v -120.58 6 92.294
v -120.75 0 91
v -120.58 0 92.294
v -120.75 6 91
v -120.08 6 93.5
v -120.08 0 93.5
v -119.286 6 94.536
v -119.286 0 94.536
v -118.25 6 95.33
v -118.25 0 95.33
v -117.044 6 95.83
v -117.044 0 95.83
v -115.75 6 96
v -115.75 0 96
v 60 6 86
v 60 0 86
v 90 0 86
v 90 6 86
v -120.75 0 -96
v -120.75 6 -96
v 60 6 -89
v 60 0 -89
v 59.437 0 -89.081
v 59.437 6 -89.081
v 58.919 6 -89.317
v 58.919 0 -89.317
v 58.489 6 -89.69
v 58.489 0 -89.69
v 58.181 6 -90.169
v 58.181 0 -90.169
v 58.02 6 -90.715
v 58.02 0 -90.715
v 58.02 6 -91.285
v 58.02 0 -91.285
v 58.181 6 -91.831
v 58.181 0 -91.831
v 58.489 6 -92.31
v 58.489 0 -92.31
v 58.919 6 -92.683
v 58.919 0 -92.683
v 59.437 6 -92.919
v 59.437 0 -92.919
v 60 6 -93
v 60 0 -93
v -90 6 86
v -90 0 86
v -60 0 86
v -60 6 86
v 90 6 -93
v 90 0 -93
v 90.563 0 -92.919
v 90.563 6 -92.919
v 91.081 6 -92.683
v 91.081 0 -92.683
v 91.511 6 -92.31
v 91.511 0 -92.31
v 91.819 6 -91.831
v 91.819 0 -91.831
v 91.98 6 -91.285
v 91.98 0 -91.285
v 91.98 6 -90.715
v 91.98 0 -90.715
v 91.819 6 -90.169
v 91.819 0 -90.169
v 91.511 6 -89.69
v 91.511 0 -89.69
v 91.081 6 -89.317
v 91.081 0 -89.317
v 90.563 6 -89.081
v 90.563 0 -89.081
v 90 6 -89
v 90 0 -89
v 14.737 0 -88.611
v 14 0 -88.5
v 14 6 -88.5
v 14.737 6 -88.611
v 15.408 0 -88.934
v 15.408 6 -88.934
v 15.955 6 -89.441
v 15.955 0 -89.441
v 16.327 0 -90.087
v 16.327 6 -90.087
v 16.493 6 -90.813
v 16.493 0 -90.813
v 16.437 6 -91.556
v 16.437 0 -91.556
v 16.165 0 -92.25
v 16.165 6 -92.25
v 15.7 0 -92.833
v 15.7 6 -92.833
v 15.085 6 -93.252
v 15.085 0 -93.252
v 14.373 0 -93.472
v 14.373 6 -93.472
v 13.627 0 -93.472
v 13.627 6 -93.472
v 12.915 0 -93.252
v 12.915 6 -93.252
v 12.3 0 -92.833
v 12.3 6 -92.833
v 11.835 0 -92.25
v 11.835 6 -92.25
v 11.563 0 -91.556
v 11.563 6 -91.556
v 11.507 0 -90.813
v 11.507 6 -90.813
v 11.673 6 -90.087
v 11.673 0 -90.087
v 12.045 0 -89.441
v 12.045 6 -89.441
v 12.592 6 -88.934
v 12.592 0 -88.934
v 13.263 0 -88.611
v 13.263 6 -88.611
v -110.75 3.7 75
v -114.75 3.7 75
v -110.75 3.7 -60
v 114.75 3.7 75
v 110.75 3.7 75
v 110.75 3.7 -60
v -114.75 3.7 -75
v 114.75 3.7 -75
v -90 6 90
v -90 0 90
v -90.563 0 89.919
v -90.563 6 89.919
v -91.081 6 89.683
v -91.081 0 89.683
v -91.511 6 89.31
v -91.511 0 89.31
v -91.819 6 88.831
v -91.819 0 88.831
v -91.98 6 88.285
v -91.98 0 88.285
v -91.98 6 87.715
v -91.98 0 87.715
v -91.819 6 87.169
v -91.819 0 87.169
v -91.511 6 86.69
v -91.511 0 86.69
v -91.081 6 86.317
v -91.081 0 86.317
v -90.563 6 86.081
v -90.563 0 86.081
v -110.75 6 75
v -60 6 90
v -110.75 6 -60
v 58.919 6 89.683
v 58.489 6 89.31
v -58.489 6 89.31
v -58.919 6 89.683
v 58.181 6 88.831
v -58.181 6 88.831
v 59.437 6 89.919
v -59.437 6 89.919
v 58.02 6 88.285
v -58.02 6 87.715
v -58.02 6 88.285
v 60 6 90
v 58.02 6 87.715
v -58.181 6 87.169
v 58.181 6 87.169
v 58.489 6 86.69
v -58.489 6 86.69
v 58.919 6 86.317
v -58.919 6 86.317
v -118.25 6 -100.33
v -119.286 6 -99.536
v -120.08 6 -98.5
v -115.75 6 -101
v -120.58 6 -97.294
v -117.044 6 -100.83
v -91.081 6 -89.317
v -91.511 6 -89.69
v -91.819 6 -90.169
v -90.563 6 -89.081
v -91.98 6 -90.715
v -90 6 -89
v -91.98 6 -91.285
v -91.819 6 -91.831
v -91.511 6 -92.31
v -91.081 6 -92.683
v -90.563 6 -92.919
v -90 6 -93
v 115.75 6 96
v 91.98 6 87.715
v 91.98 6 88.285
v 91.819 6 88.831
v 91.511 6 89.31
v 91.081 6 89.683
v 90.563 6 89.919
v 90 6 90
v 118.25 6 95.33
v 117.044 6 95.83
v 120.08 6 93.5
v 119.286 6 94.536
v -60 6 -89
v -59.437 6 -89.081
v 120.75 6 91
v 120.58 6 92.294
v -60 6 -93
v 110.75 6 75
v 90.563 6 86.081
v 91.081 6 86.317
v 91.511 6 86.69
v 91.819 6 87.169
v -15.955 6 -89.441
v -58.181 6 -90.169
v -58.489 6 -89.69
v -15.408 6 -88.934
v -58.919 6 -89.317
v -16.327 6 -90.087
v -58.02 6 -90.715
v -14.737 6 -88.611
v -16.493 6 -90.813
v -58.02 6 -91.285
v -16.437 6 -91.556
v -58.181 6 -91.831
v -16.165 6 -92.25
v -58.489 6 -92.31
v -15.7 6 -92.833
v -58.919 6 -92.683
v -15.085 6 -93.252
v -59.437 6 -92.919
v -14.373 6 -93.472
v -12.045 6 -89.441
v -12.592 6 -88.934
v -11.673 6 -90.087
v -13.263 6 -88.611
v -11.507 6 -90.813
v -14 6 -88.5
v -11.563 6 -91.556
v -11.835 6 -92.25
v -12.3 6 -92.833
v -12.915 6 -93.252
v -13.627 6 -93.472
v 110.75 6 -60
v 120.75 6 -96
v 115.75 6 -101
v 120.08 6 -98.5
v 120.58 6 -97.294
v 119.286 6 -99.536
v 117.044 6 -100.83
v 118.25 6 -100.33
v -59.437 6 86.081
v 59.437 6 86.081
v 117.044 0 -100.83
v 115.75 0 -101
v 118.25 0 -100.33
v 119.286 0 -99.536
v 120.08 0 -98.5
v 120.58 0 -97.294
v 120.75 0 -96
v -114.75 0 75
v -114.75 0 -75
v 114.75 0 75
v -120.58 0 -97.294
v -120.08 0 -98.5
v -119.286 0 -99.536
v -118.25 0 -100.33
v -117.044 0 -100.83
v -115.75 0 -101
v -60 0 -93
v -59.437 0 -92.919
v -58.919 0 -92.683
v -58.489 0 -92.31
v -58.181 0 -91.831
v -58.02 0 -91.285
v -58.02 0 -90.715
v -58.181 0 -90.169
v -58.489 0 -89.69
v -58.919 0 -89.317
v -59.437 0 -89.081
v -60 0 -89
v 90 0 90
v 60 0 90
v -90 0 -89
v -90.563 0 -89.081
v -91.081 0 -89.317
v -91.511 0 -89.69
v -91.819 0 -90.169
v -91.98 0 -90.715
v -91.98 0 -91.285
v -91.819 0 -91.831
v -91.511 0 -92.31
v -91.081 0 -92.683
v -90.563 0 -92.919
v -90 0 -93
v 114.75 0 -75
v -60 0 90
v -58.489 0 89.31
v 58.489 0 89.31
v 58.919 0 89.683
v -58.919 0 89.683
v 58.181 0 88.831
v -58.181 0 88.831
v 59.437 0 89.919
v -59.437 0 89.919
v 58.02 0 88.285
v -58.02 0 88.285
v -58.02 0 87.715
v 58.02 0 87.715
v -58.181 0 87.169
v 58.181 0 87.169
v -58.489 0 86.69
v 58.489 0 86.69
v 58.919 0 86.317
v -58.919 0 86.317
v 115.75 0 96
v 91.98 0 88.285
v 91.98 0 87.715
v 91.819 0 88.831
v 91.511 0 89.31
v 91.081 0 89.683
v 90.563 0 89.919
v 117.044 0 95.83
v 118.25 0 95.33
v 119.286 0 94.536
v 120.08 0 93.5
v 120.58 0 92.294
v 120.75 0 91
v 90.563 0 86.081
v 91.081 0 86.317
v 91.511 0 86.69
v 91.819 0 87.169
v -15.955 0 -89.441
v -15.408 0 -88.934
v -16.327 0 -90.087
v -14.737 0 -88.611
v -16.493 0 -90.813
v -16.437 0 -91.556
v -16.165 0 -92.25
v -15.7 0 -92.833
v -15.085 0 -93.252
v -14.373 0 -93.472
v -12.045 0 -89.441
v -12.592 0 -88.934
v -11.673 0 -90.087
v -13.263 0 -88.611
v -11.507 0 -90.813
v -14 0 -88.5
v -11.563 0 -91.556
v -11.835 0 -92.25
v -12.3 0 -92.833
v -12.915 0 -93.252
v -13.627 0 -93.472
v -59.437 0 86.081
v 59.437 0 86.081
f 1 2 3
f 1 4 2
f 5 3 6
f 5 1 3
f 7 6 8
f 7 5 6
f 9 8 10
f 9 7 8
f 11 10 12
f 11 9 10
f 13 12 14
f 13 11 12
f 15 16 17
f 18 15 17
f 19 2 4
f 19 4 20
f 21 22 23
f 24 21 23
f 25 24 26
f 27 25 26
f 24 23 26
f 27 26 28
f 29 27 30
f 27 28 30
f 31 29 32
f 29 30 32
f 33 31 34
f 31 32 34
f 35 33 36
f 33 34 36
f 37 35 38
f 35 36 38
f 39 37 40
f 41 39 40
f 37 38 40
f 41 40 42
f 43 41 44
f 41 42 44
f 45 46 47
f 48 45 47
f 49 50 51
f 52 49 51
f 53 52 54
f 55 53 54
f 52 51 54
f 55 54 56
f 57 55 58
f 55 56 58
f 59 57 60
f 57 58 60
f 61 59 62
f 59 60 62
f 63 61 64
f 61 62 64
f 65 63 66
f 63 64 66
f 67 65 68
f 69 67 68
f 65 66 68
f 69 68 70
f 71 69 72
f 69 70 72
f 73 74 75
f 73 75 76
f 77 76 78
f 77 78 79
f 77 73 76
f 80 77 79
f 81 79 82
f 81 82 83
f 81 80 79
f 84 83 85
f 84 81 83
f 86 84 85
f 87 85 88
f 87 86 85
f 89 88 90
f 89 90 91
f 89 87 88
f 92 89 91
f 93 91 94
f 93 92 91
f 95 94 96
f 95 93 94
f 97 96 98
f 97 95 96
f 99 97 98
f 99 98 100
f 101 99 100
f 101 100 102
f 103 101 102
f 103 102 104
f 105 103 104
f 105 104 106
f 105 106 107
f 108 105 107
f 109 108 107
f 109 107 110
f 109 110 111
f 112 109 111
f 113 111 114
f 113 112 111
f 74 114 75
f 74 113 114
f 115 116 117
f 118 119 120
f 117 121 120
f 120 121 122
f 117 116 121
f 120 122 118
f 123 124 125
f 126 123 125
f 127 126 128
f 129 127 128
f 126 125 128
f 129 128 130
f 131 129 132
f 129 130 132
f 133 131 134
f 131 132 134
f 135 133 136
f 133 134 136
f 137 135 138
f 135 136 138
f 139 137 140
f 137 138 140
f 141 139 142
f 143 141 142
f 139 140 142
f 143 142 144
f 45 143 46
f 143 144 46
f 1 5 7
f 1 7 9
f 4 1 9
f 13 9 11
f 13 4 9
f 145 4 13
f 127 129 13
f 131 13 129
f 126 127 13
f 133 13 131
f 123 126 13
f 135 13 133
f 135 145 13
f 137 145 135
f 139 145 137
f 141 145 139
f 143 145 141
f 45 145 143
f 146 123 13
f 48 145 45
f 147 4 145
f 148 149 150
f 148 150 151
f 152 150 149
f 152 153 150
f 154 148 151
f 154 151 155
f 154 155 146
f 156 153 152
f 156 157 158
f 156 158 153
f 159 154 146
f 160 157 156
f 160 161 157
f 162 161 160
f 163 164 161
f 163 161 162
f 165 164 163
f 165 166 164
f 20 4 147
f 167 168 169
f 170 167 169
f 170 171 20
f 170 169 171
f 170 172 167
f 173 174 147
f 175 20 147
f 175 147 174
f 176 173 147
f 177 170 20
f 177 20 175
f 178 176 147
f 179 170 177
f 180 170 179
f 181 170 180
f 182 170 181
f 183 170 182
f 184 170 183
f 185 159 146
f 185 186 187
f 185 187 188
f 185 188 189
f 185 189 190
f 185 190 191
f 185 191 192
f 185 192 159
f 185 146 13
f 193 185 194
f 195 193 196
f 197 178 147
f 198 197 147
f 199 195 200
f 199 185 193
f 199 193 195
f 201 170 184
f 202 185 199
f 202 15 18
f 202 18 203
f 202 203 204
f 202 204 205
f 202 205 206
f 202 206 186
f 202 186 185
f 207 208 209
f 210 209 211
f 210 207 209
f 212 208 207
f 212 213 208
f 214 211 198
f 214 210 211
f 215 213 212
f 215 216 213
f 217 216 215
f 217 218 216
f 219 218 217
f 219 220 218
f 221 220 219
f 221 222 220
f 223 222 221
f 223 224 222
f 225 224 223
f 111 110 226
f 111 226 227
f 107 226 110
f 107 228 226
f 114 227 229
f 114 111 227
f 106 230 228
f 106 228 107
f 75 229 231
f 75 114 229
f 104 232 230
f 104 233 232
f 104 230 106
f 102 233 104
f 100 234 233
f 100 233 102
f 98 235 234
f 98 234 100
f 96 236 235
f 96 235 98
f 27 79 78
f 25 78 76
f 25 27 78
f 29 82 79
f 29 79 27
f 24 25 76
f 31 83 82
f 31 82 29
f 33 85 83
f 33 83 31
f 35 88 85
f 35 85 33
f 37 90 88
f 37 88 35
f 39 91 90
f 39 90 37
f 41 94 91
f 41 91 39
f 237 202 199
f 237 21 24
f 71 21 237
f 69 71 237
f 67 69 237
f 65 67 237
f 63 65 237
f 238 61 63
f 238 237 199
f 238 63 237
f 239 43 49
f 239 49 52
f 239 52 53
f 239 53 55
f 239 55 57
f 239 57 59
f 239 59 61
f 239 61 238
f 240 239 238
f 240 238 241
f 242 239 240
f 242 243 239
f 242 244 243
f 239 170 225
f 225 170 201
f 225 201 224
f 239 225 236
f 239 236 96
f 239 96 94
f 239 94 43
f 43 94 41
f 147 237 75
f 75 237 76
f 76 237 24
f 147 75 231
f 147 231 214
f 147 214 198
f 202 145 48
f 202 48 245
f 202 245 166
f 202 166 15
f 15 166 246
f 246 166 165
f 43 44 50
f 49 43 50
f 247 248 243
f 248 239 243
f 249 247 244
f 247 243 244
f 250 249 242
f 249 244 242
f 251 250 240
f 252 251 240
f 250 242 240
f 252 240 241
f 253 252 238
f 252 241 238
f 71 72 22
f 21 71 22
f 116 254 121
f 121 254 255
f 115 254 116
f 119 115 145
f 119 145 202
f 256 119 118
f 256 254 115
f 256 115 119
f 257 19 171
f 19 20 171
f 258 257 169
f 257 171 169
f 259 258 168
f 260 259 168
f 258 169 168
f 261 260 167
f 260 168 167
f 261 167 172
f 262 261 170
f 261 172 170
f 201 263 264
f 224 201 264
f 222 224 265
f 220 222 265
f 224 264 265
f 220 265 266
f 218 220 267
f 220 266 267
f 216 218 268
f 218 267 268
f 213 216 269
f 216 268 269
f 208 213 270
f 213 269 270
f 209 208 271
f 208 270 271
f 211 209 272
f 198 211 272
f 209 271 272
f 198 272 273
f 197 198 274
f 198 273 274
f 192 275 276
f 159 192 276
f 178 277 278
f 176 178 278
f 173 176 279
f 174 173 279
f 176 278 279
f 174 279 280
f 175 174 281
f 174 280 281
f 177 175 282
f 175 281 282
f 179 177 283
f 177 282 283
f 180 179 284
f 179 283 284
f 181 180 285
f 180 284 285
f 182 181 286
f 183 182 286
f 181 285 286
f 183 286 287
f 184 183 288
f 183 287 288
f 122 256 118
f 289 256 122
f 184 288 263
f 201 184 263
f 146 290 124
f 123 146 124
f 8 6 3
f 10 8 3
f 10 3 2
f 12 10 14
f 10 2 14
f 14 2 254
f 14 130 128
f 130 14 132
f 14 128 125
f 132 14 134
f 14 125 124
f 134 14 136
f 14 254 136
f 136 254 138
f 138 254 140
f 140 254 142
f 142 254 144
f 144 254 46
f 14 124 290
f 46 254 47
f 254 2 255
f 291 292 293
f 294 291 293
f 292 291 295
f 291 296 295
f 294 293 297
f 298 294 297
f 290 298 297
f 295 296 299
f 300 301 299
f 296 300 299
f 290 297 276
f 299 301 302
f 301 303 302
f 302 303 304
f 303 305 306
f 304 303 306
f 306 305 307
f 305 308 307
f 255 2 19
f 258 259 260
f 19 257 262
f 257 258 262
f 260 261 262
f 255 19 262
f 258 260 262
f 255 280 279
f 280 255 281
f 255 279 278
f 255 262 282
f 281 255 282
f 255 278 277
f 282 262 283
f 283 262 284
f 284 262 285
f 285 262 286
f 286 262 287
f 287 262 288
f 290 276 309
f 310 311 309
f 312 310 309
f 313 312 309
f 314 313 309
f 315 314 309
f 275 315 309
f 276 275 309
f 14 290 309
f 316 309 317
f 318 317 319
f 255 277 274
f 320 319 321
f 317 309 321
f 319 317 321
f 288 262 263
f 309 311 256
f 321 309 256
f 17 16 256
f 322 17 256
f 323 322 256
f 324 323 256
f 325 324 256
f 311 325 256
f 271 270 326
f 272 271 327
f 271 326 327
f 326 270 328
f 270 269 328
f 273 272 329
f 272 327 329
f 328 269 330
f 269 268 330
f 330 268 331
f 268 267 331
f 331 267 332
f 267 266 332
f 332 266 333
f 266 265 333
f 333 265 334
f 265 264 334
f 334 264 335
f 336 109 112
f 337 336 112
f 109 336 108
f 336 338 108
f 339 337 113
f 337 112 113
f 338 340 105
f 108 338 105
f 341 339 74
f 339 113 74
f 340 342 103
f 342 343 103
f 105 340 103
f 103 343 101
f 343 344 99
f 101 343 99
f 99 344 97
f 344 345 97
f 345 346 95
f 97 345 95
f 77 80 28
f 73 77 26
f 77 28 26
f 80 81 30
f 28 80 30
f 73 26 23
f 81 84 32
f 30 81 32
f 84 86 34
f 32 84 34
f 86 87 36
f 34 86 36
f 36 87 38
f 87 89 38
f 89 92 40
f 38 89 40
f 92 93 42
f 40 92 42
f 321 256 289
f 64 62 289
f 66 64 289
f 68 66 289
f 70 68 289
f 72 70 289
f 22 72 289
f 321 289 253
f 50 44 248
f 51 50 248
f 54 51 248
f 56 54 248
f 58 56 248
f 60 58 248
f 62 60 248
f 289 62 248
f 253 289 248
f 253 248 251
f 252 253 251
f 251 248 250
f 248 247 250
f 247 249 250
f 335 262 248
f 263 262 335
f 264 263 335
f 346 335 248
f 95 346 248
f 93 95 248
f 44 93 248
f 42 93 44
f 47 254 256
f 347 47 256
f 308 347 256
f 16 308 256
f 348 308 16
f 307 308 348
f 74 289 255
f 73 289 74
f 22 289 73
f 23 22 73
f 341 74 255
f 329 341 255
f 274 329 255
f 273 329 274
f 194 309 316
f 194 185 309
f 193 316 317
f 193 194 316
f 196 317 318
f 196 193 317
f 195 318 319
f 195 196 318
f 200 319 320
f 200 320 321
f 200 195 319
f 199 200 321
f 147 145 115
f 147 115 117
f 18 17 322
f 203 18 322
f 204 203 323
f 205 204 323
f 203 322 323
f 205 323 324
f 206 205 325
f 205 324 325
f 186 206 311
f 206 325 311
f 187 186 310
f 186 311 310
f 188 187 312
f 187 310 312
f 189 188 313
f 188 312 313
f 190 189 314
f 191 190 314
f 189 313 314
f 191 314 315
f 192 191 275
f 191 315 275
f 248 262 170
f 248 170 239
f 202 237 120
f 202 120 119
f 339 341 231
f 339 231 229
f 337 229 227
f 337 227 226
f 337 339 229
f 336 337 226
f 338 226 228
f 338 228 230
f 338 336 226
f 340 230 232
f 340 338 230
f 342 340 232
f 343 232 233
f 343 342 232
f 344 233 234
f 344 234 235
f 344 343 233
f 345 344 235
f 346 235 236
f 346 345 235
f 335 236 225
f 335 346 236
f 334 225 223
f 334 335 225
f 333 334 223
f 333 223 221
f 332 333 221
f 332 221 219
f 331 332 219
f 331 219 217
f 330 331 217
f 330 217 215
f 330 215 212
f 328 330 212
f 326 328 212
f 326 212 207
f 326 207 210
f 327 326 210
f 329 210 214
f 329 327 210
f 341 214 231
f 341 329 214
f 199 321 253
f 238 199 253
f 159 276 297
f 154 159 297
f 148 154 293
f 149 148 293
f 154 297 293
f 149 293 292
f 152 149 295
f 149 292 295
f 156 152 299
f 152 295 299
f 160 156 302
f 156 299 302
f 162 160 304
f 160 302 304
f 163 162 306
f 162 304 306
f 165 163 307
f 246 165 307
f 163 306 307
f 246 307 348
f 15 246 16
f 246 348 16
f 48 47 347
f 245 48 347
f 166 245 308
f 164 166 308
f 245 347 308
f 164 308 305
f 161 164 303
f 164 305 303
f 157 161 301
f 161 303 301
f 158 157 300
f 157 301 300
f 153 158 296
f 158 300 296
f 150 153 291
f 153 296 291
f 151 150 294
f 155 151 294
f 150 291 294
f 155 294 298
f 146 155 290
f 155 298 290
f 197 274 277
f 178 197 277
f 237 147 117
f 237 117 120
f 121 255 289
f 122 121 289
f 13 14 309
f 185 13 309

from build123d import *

# Parameters (mm, degrees)
SKETCH1_W               = 241.5
SKETCH1_H               = 197
SKETCH1_R               = 2.5
BOSS_EXTRUDE1_DEPTH     = 6
SKETCH1_5_W             = 229.5
SKETCH1_5_H             = 150
CUT_EXTRUDE1_DEPTH      = 3.7
FILLET1_R               = 5
CUT_EXTRUDE3_DEPTH      = 158.465083431
CUT_EXTRUDE3_DEPTH_BACK = 158.465083431


with BuildPart() as part:
    # Sketch1 → Boss-Extrude1 (new body)
    with BuildSketch(Plane(origin=(0, 0, 0), x_dir=(1, 0, 0), z_dir=(0, 1, 0))):
        with Locations((0, 2.5)):
            Rectangle(SKETCH1_W, SKETCH1_H)
        with BuildLine():
            ThreePointArc((90, 93), (92, 91), (90, 89))
            Line((90, 89), (60, 89))
            ThreePointArc((60, 89), (58, 91), (60, 93))
            Line((60, 93), (90, 93))
        make_face(mode=Mode.SUBTRACT)
        with BuildLine():
            ThreePointArc((-90, 89), (-92, 91), (-90, 93))
            Line((-90, 93), (-60, 93))
            ThreePointArc((-60, 93), (-58, 91), (-60, 89))
            Line((-60, 89), (-90, 89))
        make_face(mode=Mode.SUBTRACT)
        with Locations(Location((-14, 91, 0), (0, 0, 270))):
            Circle(SKETCH1_R, mode=Mode.SUBTRACT)
        with Locations(Location((14, 91, 0), (0, 0, 270))):
            Circle(SKETCH1_R, mode=Mode.SUBTRACT)
        with BuildLine():
            ThreePointArc((90, -86), (92, -88), (90, -90))
            Line((90, -90), (60, -90))
            ThreePointArc((60, -90), (58, -88), (60, -86))
            Line((60, -86), (90, -86))
        make_face(mode=Mode.SUBTRACT)
        with BuildLine():
            ThreePointArc((-90, -90), (-92, -88), (-90, -86))
            Line((-90, -86), (-60, -86))
            ThreePointArc((-60, -86), (-58, -88), (-60, -90))
            Line((-60, -90), (-90, -90))
        make_face(mode=Mode.SUBTRACT)
    extrude(amount=BOSS_EXTRUDE1_DEPTH)

    # Sketch1<5> → Cut-Extrude1 (cut)
    with BuildSketch(Plane(origin=(0, 0, 0), x_dir=(1, 0, 0), z_dir=(0, 1, 0))):
        Rectangle(SKETCH1_5_W, SKETCH1_5_H)
    extrude(amount=CUT_EXTRUDE1_DEPTH, mode=Mode.SUBTRACT)

    # Fillet1
    fillet1_edges = [part.edges().sort_by_distance(p)[0] for p in [
        (-120.75, 3, -101),
        (120.75, 3, -101),
        (-120.75, 3, 96),
        (120.75, 3, 96),
    ]]
    fillet(fillet1_edges, radius=FILLET1_R)

    # Sketch2 → Cut-Extrude3 (cut, two sides: drawn at the far end of the back side and taken through both)
    with BuildSketch(Plane.XZ.offset(-3.7).offset(-CUT_EXTRUDE3_DEPTH_BACK)):
        Polygon((94.75, -60), (110.75, -60), (110.75, 75), (94.75, 75), (-94.75, 75), (-110.75, 75), (-110.75, -60), align=None)
    extrude(amount=CUT_EXTRUDE3_DEPTH + CUT_EXTRUDE3_DEPTH_BACK, mode=Mode.SUBTRACT)


solid = part.part
